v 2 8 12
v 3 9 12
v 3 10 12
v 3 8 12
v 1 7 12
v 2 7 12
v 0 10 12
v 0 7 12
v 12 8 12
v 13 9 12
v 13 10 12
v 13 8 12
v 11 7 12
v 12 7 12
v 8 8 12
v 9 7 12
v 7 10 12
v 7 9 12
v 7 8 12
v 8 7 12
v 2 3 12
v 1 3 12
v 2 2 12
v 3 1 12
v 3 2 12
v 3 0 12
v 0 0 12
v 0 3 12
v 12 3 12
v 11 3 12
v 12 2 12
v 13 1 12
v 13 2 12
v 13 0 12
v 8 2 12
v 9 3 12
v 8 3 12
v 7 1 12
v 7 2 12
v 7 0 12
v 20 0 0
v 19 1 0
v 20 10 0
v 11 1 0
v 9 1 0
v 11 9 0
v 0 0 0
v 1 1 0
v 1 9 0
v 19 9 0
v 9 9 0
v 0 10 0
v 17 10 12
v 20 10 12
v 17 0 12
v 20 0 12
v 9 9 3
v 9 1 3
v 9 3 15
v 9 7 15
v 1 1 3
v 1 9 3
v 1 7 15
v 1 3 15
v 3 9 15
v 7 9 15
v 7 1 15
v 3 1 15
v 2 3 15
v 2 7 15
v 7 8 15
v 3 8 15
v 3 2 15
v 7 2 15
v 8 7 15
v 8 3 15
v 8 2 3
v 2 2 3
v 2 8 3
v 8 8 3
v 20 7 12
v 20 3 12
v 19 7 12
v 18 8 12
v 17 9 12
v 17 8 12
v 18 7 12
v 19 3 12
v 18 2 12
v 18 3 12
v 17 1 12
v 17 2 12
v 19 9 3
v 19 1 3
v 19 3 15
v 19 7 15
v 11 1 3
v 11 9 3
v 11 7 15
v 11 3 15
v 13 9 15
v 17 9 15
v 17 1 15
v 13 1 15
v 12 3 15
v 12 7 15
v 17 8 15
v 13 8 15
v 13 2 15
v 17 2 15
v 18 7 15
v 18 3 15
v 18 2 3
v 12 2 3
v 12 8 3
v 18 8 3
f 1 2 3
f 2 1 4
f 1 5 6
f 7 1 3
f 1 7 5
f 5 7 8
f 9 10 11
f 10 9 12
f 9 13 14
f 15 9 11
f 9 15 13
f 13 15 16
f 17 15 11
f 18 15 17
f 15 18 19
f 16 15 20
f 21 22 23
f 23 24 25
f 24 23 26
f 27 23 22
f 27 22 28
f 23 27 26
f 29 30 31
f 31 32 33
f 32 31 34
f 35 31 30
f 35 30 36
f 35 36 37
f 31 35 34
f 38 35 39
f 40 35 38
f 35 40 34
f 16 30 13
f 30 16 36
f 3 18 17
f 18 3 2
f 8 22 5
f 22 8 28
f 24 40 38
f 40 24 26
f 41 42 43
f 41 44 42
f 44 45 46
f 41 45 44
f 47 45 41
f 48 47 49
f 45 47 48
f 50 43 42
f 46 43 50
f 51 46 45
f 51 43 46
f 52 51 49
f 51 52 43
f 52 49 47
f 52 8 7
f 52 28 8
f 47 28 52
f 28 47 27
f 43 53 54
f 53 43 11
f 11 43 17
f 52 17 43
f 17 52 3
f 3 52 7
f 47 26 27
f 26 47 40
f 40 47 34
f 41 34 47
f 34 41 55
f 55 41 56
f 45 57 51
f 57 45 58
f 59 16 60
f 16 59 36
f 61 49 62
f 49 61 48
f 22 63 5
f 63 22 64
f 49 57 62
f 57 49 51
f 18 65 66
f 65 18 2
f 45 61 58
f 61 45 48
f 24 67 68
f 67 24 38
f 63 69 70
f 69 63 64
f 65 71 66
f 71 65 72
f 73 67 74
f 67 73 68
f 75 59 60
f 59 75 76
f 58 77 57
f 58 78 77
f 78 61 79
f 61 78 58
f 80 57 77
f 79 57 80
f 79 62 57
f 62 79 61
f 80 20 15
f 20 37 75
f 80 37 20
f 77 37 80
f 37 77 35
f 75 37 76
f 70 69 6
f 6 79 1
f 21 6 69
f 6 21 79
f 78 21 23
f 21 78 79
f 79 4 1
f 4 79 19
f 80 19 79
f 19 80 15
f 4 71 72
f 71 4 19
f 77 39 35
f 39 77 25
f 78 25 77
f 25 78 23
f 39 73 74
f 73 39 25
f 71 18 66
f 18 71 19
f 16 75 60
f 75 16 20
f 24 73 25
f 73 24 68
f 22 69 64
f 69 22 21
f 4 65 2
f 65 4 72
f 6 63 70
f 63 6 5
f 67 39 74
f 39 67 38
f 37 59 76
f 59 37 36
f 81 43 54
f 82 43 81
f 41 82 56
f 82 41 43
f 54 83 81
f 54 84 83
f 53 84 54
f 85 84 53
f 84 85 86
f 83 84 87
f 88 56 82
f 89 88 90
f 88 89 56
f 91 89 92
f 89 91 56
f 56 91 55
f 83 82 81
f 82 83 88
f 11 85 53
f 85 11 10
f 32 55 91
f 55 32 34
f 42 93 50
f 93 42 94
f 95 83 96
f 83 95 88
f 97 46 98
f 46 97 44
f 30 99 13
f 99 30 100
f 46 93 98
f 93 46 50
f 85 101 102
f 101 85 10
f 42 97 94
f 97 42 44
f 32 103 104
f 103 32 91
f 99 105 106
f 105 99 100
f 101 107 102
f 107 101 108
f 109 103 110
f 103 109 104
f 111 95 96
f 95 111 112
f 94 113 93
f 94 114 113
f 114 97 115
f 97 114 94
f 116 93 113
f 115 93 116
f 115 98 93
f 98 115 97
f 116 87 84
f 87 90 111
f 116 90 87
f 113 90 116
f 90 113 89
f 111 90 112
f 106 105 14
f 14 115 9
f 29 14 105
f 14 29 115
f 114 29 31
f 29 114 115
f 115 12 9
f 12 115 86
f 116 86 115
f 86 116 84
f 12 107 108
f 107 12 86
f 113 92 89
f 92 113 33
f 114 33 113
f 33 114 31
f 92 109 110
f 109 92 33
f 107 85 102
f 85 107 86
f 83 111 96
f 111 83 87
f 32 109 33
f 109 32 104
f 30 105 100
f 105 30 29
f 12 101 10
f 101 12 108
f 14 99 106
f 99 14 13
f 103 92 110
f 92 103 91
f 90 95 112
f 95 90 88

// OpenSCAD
union(){
    translate(v=[0, 0, 0]){
        difference(){
            union(){
                difference(){
                    cube(size=[10, 10, 12]);
                    translate(v=[1, 1, 0]){
                        cube(size=[8, 8, 12]);
                    };
                };
                translate(v=[1, 1, 3]){
                    difference(){
                        cube(size=[8, 8, 12]);
                        translate(v=[1, 1, 0]){
                            cube(size=[6, 6, 12]);
                        };
                    };
                };
            };
            union(){
                translate(v=[7, 7, 12]){
                    cube(size=[3, 3, 5]);
                };
                translate(v=[0, 0, 12]){
                    cube(size=[3, 3, 5]);
                };
                translate(v=[0, 7, 12]){
                    cube(size=[3, 3, 5]);
                };
                translate(v=[7, 0, 12]){
                    cube(size=[3, 3, 5]);
                };
            };
        };
    };
    translate(v=[10, 0, 0]){
        difference(){
            union(){
                difference(){
                    cube(size=[10, 10, 12]);
                    translate(v=[1, 1, 0]){
                        cube(size=[8, 8, 12]);
                    };
                };
                translate(v=[1, 1, 3]){
                    difference(){
                        cube(size=[8, 8, 12]);
                        translate(v=[1, 1, 0]){
                            cube(size=[6, 6, 12]);
                        };
                    };
                };
            };
            union(){
                translate(v=[7, 7, 12]){
                    cube(size=[3, 3, 5]);
                };
                translate(v=[0, 0, 12]){
                    cube(size=[3, 3, 5]);
                };
                translate(v=[0, 7, 12]){
                    cube(size=[3, 3, 5]);
                };
                translate(v=[7, 0, 12]){
                    cube(size=[3, 3, 5]);
                };
            };
        };
    };
};
